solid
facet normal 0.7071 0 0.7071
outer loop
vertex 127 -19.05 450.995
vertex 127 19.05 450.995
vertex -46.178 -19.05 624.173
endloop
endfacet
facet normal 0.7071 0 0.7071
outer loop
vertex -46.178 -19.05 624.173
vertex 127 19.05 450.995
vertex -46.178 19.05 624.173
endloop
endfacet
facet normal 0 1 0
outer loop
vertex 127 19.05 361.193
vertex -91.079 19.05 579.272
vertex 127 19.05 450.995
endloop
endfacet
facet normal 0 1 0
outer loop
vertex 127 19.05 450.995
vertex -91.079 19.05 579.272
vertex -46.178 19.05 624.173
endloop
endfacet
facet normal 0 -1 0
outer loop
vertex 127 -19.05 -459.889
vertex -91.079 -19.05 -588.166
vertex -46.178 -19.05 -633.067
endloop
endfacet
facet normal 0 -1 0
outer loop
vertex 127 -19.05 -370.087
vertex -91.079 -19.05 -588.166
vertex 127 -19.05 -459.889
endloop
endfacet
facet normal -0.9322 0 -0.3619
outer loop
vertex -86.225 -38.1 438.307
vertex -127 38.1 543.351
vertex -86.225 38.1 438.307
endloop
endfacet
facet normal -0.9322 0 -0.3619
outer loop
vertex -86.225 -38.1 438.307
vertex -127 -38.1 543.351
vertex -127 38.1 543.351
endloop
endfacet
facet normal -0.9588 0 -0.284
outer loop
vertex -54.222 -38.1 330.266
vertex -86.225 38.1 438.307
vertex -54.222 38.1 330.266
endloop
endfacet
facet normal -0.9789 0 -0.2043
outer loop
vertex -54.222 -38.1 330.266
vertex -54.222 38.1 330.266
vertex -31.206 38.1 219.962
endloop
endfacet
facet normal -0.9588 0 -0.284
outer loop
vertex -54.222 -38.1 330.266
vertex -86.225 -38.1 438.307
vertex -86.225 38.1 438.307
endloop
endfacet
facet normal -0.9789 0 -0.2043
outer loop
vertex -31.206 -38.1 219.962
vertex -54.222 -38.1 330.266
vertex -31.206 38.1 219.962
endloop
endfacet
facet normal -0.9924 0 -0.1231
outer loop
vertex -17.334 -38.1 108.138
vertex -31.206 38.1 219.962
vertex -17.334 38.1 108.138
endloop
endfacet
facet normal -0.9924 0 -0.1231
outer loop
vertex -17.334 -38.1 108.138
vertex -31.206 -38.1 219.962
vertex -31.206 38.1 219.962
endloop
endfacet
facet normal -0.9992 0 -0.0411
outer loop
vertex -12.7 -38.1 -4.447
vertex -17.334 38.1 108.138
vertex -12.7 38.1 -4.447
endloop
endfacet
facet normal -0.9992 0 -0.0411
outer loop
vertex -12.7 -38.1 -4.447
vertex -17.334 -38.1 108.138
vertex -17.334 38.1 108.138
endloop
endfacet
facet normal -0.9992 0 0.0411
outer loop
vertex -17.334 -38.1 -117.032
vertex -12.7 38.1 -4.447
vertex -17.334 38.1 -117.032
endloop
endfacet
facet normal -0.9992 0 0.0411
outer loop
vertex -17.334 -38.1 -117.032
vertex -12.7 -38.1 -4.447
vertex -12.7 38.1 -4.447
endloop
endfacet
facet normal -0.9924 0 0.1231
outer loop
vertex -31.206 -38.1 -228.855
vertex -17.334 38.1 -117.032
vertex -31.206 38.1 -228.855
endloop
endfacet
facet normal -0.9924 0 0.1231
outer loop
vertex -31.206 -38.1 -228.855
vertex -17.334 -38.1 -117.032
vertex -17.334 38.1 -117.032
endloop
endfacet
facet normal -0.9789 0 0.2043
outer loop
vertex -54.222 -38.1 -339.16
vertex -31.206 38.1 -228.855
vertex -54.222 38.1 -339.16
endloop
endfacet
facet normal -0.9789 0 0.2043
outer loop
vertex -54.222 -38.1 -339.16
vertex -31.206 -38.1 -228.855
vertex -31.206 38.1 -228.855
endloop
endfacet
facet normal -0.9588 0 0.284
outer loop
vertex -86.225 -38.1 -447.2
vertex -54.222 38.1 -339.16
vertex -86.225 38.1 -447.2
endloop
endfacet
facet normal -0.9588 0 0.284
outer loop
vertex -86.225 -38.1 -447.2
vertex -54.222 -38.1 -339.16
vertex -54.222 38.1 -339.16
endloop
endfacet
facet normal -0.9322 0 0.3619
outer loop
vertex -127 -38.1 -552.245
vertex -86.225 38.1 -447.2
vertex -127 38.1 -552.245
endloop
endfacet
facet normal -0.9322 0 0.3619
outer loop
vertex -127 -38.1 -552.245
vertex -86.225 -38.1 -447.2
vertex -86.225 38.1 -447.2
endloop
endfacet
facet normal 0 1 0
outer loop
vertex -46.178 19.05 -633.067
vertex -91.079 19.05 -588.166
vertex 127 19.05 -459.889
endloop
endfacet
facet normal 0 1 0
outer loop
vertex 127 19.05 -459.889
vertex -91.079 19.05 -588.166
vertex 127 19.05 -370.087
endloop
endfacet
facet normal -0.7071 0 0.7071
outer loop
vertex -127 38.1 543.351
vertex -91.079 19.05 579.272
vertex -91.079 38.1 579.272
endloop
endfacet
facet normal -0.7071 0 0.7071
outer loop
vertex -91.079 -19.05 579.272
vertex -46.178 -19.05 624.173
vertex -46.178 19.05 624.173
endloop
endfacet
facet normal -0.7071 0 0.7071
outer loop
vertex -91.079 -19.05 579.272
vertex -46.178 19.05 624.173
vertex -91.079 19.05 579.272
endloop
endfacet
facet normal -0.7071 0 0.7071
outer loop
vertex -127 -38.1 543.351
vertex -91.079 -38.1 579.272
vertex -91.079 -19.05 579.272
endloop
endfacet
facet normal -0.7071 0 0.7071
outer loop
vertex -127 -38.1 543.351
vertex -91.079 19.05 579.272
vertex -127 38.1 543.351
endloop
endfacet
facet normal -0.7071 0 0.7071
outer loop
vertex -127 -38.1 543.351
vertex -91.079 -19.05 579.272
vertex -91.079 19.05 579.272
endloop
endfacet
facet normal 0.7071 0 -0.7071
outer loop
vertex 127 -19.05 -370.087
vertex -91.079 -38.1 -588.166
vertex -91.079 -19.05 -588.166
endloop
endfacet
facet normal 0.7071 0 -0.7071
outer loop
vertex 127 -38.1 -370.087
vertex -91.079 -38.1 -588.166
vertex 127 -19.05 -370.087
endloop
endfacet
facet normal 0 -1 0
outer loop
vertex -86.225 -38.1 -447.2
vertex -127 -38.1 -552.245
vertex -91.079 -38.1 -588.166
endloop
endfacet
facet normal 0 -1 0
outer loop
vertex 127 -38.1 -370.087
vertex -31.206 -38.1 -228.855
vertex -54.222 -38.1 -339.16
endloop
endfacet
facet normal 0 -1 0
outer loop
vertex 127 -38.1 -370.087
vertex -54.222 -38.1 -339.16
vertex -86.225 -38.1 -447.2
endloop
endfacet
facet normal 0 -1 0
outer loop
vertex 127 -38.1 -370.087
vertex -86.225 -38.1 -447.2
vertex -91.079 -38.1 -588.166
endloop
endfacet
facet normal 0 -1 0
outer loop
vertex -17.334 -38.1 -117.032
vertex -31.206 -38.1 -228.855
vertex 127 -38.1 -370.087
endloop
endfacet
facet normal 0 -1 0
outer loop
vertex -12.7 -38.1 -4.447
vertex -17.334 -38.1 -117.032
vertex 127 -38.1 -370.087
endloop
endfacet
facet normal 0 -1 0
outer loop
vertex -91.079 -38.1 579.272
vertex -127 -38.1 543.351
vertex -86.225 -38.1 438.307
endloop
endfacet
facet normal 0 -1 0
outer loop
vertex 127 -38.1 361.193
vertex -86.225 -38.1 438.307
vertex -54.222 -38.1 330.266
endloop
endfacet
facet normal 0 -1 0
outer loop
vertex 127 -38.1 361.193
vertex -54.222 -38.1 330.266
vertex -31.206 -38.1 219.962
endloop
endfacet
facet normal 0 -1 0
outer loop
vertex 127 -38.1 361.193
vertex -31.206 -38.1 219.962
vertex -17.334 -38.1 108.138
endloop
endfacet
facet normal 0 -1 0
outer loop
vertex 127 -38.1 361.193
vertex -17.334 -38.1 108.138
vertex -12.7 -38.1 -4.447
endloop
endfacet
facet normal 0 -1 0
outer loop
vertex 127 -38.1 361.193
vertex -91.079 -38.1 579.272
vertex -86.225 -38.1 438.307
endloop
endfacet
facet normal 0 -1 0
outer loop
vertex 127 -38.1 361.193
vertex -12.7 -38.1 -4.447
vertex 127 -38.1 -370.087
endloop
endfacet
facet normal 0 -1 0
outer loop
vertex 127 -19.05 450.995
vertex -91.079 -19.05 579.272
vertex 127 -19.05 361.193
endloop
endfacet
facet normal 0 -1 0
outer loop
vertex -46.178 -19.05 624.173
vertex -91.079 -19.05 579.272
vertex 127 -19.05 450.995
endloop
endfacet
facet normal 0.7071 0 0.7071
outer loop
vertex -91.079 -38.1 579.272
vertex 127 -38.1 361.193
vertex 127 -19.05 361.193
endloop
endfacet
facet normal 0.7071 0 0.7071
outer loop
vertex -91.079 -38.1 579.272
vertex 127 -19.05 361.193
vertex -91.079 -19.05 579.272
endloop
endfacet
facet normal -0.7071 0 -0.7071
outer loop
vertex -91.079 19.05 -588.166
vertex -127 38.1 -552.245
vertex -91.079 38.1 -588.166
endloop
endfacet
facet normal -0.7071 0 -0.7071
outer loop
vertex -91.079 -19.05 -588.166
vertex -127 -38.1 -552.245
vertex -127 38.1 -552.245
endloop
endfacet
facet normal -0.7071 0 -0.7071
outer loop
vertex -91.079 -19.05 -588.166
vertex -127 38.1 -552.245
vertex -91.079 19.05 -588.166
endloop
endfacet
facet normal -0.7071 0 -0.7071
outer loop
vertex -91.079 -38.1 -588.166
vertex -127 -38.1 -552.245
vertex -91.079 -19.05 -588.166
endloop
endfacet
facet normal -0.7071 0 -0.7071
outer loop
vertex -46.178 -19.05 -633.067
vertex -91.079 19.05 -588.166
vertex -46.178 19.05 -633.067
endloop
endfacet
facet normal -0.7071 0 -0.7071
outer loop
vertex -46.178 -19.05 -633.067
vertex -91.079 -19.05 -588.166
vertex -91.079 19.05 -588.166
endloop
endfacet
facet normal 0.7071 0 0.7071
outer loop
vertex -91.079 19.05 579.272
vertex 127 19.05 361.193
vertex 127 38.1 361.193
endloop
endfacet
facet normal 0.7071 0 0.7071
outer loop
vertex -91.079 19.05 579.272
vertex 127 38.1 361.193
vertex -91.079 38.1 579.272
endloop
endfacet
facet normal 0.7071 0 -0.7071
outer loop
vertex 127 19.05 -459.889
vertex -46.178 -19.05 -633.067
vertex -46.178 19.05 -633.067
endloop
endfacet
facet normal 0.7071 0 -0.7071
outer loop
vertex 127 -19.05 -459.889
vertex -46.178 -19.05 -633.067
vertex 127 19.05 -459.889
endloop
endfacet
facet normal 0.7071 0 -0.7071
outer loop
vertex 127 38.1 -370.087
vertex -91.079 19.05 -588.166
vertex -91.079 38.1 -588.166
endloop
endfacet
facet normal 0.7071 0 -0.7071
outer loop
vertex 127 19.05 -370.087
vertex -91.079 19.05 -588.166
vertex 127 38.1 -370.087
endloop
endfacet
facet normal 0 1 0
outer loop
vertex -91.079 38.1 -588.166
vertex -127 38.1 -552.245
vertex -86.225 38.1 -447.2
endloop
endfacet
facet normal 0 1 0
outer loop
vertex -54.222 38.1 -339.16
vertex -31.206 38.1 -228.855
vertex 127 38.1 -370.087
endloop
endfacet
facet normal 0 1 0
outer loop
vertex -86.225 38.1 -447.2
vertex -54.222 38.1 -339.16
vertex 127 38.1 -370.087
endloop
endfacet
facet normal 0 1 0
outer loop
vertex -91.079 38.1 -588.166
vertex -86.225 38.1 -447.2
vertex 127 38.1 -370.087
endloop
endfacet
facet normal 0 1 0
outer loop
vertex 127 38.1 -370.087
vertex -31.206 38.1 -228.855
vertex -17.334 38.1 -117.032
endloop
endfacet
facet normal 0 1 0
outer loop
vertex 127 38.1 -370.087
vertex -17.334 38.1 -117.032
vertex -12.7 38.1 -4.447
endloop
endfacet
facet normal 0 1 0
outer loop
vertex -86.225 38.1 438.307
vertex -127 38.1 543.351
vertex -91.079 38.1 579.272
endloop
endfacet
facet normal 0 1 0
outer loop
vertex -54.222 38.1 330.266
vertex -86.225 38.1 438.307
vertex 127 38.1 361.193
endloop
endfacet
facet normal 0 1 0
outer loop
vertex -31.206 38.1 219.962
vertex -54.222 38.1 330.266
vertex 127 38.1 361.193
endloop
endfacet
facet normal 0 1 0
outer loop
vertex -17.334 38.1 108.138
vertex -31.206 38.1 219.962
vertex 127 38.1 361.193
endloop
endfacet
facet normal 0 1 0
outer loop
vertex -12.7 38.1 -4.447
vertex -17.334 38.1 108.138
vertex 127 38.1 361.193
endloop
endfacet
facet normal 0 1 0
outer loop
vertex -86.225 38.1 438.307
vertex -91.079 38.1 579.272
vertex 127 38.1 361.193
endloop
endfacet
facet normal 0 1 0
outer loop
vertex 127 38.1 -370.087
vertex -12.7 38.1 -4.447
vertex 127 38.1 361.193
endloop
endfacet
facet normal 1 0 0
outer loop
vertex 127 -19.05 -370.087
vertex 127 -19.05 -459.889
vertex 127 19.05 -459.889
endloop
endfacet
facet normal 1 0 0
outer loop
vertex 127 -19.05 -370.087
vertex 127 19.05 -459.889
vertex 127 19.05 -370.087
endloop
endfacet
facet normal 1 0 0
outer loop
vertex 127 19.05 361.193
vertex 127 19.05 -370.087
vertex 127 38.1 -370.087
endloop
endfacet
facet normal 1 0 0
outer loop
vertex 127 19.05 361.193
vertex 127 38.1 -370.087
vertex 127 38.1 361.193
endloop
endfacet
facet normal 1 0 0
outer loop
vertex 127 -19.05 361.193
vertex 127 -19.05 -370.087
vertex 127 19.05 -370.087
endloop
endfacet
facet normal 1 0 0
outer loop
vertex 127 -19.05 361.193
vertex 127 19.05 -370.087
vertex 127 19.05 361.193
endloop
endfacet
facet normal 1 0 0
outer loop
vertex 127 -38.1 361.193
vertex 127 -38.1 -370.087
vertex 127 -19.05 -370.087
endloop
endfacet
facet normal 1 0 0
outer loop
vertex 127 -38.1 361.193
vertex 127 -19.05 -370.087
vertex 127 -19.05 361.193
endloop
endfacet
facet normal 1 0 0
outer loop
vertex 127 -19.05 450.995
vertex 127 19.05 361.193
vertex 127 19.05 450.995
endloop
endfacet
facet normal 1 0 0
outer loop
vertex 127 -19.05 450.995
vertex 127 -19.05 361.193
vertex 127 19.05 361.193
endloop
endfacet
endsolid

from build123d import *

# Parameters (mm, degrees)
F1_DEPTH = 38.1
F2_DEPTH = 19.05


with BuildPart() as f1:
    # F0 (on Front) → F1 (new body, symmetric)
    with BuildSketch(Plane.XZ):
        with BuildLine():
            Line((127, 289.350816), (-127, 543.350816))
            ThreePointArc((-127, 543.350816), (-12.7, -4.446916), (-127, -552.244648))
            Line((-127, -552.244648), (127, -298.244648))
            Line((127, -298.244648), (127, 289.350816))
        make_face()
        Polygon((127, -298.244648), (-127, -552.244648), (-100.059232, -579.185416), (127, -352.126184), align=None)
        Polygon((-100.059232, 570.291584), (-127, 543.350816), (127, 289.350816), (127, 343.232352), align=None)
        Polygon((-91.078976, 579.27184), (-100.059232, 570.291584), (127, 343.232352), (127, 361.192865), align=None)
        Polygon((127, -352.126184), (-100.059232, -579.185416), (-91.078976, -588.165672), (127, -370.086696), align=None)
    extrude(amount=F1_DEPTH, both=True)

    # F0 (on Front) → F2 (join, symmetric)
    with BuildSketch(Plane.XZ):
        Polygon((127, 361.192865), (127, 450.995426), (-46.177695, 624.173121), (-91.078976, 579.27184), align=None)
        Polygon((127, -370.086696), (-91.078976, -588.165672), (-46.177695, -633.066953), (127, -459.889258), align=None)
    extrude(amount=F2_DEPTH, both=True)


solid = f1.part
